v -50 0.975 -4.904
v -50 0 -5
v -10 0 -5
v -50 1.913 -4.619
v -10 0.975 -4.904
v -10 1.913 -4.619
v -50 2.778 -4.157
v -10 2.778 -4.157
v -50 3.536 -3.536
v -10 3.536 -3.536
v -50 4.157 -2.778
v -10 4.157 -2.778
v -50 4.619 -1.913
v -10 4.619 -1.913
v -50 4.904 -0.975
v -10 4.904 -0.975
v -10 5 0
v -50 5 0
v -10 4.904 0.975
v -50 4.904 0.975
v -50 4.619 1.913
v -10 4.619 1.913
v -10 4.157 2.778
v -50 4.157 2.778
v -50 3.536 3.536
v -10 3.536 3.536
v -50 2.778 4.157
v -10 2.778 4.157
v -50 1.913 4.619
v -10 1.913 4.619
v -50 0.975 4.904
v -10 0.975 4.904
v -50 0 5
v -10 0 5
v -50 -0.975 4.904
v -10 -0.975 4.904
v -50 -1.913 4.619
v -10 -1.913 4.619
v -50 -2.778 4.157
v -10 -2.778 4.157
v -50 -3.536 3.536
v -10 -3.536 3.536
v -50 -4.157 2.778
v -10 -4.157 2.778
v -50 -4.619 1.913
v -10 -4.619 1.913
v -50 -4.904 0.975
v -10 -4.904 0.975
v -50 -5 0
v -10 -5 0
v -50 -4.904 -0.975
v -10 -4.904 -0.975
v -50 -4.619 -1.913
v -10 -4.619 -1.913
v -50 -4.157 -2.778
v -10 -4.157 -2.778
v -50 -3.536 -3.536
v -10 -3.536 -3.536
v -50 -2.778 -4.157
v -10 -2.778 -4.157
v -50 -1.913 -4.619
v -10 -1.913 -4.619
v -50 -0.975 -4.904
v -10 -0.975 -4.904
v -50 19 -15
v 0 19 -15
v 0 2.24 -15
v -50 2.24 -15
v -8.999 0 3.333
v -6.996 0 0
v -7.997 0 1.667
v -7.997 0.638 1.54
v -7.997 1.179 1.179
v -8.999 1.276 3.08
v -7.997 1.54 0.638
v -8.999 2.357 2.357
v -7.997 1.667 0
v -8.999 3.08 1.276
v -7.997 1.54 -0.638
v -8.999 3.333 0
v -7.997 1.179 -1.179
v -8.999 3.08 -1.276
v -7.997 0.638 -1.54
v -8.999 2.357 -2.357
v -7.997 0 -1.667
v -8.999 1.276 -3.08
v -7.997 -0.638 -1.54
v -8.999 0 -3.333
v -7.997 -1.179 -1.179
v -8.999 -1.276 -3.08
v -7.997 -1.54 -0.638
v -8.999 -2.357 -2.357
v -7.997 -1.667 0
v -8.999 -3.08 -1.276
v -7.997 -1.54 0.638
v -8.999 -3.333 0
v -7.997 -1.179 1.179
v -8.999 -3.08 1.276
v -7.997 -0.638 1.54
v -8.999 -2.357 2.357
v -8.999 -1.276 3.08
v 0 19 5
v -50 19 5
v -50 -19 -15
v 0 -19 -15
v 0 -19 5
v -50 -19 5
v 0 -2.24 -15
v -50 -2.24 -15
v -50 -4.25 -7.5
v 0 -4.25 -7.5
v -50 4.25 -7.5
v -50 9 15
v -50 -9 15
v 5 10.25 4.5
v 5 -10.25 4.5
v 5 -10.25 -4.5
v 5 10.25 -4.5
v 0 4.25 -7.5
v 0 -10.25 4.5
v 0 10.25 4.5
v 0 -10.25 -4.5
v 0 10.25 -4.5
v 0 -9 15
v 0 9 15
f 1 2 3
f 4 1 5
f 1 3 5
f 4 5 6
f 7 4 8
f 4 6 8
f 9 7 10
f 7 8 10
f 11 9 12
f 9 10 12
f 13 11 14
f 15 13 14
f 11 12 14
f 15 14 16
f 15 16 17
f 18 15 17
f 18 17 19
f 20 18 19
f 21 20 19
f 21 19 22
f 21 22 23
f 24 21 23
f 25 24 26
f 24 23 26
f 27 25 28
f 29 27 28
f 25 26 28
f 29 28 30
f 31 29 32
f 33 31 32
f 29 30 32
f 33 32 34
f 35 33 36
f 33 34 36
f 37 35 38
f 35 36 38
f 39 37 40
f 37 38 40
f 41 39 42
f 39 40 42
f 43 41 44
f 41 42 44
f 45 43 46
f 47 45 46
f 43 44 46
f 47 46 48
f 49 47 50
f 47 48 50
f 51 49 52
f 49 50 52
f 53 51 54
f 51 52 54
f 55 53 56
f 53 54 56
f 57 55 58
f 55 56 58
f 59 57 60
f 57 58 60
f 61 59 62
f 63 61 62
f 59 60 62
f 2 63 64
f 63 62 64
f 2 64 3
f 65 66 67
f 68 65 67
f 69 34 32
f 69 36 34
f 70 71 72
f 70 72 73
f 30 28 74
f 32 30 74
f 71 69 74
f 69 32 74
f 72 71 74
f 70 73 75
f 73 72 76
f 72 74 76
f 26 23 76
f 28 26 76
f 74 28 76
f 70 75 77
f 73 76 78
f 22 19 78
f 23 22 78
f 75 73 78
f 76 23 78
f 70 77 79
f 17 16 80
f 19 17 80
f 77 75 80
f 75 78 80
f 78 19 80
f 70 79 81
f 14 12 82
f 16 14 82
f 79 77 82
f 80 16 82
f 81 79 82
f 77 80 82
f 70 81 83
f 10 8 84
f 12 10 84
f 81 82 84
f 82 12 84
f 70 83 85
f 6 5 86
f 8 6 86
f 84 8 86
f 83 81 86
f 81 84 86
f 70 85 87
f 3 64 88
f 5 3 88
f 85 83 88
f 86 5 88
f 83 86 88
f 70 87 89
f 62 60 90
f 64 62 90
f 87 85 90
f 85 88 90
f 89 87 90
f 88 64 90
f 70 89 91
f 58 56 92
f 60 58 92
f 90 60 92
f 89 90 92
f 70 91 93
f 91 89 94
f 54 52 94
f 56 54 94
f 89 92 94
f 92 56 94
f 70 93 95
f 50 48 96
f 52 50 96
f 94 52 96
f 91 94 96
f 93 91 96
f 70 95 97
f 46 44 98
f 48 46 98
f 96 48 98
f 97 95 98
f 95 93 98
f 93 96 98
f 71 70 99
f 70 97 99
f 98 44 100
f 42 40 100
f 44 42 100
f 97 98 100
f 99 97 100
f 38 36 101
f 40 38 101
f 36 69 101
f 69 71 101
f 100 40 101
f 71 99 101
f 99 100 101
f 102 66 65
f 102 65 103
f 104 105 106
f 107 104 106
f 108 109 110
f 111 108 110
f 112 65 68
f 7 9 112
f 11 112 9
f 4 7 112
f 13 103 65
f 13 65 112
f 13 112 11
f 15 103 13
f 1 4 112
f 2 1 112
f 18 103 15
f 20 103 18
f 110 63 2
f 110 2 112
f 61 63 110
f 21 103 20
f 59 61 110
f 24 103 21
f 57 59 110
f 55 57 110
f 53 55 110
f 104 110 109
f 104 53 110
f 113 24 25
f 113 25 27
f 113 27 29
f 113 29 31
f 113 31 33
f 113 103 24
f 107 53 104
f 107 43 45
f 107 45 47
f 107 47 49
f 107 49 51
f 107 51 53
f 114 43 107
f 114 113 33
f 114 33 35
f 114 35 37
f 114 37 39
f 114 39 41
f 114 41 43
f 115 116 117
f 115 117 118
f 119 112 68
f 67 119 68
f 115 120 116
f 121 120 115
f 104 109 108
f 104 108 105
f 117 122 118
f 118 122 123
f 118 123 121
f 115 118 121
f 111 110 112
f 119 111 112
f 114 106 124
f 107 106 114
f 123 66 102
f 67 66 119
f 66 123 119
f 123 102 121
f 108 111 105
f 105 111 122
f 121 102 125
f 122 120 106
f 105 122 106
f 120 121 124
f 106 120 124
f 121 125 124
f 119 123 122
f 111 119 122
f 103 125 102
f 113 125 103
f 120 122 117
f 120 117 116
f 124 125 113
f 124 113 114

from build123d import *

# Parameters (mm, degrees)
SCHIZZO1_W                   = 20.5
SCHIZZO1_H                   = 9
ESTRUSIONE_ESTRUSIONE1_DEPTH = 5
SCHIZZO2_W                   = 38
SCHIZZO2_H                   = 30
ESTRUSIONE_ESTRUSIONE2_DEPTH = 50
TAGLIO_ESTRUSIONE1_DEPTH     = 61.09159675
M8_CLEARANCE_HOLE1_D         = 10
M8_CLEARANCE_HOLE1_DEPTH     = 40
M8_CLEARANCE_HOLE1_TIP       = 3.004303095
SMUSSO1_SIZE                 = 10


with BuildPart() as part:
    # Schizzo1 → Estrusione-Estrusione1 (new body)
    with BuildSketch(Plane.YZ):
        Rectangle(SCHIZZO1_W, SCHIZZO1_H)
    extrude(amount=ESTRUSIONE_ESTRUSIONE1_DEPTH)

    # Schizzo2 → Estrusione-Estrusione2 (add)
    with BuildSketch(Plane(origin=(0, 0, 0), x_dir=(0, -1, 0), z_dir=(-1, 0, 0))):
        Rectangle(SCHIZZO2_W, SCHIZZO2_H)
    extrude(amount=ESTRUSIONE_ESTRUSIONE2_DEPTH)

    # Schizzo3 → Taglio-Estrusione1 (cut, through all)
    with BuildSketch(Plane(origin=(-50, 0, 0), x_dir=(0, -1, 0), z_dir=(-1, 0, 0))):
        Polygon((2.240381057, -15), (4.25, -7.5), (-4.25, -7.5), (-2.240381057, -15), align=None)
    extrude(amount=-TAGLIO_ESTRUSIONE1_DEPTH, mode=Mode.SUBTRACT)

    # M8 Clearance Hole1
    with Locations(Plane.ZY.offset(50)):
        with Locations((0, 0)):
            Hole(M8_CLEARANCE_HOLE1_D / 2, depth=M8_CLEARANCE_HOLE1_DEPTH)
            with Locations((0, 0, -(M8_CLEARANCE_HOLE1_DEPTH + M8_CLEARANCE_HOLE1_TIP / 2))):  # 118° drill point
                Cone(0, M8_CLEARANCE_HOLE1_D / 2, M8_CLEARANCE_HOLE1_TIP, mode=Mode.SUBTRACT)

    # Smusso1
    smusso1_edges = [part.edges().sort_by_distance(p)[0] for p in [
        (-25, -19, 15),
        (-25, 19, 15),
    ]]
    chamfer(smusso1_edges, length=SMUSSO1_SIZE)


solid = part.part
